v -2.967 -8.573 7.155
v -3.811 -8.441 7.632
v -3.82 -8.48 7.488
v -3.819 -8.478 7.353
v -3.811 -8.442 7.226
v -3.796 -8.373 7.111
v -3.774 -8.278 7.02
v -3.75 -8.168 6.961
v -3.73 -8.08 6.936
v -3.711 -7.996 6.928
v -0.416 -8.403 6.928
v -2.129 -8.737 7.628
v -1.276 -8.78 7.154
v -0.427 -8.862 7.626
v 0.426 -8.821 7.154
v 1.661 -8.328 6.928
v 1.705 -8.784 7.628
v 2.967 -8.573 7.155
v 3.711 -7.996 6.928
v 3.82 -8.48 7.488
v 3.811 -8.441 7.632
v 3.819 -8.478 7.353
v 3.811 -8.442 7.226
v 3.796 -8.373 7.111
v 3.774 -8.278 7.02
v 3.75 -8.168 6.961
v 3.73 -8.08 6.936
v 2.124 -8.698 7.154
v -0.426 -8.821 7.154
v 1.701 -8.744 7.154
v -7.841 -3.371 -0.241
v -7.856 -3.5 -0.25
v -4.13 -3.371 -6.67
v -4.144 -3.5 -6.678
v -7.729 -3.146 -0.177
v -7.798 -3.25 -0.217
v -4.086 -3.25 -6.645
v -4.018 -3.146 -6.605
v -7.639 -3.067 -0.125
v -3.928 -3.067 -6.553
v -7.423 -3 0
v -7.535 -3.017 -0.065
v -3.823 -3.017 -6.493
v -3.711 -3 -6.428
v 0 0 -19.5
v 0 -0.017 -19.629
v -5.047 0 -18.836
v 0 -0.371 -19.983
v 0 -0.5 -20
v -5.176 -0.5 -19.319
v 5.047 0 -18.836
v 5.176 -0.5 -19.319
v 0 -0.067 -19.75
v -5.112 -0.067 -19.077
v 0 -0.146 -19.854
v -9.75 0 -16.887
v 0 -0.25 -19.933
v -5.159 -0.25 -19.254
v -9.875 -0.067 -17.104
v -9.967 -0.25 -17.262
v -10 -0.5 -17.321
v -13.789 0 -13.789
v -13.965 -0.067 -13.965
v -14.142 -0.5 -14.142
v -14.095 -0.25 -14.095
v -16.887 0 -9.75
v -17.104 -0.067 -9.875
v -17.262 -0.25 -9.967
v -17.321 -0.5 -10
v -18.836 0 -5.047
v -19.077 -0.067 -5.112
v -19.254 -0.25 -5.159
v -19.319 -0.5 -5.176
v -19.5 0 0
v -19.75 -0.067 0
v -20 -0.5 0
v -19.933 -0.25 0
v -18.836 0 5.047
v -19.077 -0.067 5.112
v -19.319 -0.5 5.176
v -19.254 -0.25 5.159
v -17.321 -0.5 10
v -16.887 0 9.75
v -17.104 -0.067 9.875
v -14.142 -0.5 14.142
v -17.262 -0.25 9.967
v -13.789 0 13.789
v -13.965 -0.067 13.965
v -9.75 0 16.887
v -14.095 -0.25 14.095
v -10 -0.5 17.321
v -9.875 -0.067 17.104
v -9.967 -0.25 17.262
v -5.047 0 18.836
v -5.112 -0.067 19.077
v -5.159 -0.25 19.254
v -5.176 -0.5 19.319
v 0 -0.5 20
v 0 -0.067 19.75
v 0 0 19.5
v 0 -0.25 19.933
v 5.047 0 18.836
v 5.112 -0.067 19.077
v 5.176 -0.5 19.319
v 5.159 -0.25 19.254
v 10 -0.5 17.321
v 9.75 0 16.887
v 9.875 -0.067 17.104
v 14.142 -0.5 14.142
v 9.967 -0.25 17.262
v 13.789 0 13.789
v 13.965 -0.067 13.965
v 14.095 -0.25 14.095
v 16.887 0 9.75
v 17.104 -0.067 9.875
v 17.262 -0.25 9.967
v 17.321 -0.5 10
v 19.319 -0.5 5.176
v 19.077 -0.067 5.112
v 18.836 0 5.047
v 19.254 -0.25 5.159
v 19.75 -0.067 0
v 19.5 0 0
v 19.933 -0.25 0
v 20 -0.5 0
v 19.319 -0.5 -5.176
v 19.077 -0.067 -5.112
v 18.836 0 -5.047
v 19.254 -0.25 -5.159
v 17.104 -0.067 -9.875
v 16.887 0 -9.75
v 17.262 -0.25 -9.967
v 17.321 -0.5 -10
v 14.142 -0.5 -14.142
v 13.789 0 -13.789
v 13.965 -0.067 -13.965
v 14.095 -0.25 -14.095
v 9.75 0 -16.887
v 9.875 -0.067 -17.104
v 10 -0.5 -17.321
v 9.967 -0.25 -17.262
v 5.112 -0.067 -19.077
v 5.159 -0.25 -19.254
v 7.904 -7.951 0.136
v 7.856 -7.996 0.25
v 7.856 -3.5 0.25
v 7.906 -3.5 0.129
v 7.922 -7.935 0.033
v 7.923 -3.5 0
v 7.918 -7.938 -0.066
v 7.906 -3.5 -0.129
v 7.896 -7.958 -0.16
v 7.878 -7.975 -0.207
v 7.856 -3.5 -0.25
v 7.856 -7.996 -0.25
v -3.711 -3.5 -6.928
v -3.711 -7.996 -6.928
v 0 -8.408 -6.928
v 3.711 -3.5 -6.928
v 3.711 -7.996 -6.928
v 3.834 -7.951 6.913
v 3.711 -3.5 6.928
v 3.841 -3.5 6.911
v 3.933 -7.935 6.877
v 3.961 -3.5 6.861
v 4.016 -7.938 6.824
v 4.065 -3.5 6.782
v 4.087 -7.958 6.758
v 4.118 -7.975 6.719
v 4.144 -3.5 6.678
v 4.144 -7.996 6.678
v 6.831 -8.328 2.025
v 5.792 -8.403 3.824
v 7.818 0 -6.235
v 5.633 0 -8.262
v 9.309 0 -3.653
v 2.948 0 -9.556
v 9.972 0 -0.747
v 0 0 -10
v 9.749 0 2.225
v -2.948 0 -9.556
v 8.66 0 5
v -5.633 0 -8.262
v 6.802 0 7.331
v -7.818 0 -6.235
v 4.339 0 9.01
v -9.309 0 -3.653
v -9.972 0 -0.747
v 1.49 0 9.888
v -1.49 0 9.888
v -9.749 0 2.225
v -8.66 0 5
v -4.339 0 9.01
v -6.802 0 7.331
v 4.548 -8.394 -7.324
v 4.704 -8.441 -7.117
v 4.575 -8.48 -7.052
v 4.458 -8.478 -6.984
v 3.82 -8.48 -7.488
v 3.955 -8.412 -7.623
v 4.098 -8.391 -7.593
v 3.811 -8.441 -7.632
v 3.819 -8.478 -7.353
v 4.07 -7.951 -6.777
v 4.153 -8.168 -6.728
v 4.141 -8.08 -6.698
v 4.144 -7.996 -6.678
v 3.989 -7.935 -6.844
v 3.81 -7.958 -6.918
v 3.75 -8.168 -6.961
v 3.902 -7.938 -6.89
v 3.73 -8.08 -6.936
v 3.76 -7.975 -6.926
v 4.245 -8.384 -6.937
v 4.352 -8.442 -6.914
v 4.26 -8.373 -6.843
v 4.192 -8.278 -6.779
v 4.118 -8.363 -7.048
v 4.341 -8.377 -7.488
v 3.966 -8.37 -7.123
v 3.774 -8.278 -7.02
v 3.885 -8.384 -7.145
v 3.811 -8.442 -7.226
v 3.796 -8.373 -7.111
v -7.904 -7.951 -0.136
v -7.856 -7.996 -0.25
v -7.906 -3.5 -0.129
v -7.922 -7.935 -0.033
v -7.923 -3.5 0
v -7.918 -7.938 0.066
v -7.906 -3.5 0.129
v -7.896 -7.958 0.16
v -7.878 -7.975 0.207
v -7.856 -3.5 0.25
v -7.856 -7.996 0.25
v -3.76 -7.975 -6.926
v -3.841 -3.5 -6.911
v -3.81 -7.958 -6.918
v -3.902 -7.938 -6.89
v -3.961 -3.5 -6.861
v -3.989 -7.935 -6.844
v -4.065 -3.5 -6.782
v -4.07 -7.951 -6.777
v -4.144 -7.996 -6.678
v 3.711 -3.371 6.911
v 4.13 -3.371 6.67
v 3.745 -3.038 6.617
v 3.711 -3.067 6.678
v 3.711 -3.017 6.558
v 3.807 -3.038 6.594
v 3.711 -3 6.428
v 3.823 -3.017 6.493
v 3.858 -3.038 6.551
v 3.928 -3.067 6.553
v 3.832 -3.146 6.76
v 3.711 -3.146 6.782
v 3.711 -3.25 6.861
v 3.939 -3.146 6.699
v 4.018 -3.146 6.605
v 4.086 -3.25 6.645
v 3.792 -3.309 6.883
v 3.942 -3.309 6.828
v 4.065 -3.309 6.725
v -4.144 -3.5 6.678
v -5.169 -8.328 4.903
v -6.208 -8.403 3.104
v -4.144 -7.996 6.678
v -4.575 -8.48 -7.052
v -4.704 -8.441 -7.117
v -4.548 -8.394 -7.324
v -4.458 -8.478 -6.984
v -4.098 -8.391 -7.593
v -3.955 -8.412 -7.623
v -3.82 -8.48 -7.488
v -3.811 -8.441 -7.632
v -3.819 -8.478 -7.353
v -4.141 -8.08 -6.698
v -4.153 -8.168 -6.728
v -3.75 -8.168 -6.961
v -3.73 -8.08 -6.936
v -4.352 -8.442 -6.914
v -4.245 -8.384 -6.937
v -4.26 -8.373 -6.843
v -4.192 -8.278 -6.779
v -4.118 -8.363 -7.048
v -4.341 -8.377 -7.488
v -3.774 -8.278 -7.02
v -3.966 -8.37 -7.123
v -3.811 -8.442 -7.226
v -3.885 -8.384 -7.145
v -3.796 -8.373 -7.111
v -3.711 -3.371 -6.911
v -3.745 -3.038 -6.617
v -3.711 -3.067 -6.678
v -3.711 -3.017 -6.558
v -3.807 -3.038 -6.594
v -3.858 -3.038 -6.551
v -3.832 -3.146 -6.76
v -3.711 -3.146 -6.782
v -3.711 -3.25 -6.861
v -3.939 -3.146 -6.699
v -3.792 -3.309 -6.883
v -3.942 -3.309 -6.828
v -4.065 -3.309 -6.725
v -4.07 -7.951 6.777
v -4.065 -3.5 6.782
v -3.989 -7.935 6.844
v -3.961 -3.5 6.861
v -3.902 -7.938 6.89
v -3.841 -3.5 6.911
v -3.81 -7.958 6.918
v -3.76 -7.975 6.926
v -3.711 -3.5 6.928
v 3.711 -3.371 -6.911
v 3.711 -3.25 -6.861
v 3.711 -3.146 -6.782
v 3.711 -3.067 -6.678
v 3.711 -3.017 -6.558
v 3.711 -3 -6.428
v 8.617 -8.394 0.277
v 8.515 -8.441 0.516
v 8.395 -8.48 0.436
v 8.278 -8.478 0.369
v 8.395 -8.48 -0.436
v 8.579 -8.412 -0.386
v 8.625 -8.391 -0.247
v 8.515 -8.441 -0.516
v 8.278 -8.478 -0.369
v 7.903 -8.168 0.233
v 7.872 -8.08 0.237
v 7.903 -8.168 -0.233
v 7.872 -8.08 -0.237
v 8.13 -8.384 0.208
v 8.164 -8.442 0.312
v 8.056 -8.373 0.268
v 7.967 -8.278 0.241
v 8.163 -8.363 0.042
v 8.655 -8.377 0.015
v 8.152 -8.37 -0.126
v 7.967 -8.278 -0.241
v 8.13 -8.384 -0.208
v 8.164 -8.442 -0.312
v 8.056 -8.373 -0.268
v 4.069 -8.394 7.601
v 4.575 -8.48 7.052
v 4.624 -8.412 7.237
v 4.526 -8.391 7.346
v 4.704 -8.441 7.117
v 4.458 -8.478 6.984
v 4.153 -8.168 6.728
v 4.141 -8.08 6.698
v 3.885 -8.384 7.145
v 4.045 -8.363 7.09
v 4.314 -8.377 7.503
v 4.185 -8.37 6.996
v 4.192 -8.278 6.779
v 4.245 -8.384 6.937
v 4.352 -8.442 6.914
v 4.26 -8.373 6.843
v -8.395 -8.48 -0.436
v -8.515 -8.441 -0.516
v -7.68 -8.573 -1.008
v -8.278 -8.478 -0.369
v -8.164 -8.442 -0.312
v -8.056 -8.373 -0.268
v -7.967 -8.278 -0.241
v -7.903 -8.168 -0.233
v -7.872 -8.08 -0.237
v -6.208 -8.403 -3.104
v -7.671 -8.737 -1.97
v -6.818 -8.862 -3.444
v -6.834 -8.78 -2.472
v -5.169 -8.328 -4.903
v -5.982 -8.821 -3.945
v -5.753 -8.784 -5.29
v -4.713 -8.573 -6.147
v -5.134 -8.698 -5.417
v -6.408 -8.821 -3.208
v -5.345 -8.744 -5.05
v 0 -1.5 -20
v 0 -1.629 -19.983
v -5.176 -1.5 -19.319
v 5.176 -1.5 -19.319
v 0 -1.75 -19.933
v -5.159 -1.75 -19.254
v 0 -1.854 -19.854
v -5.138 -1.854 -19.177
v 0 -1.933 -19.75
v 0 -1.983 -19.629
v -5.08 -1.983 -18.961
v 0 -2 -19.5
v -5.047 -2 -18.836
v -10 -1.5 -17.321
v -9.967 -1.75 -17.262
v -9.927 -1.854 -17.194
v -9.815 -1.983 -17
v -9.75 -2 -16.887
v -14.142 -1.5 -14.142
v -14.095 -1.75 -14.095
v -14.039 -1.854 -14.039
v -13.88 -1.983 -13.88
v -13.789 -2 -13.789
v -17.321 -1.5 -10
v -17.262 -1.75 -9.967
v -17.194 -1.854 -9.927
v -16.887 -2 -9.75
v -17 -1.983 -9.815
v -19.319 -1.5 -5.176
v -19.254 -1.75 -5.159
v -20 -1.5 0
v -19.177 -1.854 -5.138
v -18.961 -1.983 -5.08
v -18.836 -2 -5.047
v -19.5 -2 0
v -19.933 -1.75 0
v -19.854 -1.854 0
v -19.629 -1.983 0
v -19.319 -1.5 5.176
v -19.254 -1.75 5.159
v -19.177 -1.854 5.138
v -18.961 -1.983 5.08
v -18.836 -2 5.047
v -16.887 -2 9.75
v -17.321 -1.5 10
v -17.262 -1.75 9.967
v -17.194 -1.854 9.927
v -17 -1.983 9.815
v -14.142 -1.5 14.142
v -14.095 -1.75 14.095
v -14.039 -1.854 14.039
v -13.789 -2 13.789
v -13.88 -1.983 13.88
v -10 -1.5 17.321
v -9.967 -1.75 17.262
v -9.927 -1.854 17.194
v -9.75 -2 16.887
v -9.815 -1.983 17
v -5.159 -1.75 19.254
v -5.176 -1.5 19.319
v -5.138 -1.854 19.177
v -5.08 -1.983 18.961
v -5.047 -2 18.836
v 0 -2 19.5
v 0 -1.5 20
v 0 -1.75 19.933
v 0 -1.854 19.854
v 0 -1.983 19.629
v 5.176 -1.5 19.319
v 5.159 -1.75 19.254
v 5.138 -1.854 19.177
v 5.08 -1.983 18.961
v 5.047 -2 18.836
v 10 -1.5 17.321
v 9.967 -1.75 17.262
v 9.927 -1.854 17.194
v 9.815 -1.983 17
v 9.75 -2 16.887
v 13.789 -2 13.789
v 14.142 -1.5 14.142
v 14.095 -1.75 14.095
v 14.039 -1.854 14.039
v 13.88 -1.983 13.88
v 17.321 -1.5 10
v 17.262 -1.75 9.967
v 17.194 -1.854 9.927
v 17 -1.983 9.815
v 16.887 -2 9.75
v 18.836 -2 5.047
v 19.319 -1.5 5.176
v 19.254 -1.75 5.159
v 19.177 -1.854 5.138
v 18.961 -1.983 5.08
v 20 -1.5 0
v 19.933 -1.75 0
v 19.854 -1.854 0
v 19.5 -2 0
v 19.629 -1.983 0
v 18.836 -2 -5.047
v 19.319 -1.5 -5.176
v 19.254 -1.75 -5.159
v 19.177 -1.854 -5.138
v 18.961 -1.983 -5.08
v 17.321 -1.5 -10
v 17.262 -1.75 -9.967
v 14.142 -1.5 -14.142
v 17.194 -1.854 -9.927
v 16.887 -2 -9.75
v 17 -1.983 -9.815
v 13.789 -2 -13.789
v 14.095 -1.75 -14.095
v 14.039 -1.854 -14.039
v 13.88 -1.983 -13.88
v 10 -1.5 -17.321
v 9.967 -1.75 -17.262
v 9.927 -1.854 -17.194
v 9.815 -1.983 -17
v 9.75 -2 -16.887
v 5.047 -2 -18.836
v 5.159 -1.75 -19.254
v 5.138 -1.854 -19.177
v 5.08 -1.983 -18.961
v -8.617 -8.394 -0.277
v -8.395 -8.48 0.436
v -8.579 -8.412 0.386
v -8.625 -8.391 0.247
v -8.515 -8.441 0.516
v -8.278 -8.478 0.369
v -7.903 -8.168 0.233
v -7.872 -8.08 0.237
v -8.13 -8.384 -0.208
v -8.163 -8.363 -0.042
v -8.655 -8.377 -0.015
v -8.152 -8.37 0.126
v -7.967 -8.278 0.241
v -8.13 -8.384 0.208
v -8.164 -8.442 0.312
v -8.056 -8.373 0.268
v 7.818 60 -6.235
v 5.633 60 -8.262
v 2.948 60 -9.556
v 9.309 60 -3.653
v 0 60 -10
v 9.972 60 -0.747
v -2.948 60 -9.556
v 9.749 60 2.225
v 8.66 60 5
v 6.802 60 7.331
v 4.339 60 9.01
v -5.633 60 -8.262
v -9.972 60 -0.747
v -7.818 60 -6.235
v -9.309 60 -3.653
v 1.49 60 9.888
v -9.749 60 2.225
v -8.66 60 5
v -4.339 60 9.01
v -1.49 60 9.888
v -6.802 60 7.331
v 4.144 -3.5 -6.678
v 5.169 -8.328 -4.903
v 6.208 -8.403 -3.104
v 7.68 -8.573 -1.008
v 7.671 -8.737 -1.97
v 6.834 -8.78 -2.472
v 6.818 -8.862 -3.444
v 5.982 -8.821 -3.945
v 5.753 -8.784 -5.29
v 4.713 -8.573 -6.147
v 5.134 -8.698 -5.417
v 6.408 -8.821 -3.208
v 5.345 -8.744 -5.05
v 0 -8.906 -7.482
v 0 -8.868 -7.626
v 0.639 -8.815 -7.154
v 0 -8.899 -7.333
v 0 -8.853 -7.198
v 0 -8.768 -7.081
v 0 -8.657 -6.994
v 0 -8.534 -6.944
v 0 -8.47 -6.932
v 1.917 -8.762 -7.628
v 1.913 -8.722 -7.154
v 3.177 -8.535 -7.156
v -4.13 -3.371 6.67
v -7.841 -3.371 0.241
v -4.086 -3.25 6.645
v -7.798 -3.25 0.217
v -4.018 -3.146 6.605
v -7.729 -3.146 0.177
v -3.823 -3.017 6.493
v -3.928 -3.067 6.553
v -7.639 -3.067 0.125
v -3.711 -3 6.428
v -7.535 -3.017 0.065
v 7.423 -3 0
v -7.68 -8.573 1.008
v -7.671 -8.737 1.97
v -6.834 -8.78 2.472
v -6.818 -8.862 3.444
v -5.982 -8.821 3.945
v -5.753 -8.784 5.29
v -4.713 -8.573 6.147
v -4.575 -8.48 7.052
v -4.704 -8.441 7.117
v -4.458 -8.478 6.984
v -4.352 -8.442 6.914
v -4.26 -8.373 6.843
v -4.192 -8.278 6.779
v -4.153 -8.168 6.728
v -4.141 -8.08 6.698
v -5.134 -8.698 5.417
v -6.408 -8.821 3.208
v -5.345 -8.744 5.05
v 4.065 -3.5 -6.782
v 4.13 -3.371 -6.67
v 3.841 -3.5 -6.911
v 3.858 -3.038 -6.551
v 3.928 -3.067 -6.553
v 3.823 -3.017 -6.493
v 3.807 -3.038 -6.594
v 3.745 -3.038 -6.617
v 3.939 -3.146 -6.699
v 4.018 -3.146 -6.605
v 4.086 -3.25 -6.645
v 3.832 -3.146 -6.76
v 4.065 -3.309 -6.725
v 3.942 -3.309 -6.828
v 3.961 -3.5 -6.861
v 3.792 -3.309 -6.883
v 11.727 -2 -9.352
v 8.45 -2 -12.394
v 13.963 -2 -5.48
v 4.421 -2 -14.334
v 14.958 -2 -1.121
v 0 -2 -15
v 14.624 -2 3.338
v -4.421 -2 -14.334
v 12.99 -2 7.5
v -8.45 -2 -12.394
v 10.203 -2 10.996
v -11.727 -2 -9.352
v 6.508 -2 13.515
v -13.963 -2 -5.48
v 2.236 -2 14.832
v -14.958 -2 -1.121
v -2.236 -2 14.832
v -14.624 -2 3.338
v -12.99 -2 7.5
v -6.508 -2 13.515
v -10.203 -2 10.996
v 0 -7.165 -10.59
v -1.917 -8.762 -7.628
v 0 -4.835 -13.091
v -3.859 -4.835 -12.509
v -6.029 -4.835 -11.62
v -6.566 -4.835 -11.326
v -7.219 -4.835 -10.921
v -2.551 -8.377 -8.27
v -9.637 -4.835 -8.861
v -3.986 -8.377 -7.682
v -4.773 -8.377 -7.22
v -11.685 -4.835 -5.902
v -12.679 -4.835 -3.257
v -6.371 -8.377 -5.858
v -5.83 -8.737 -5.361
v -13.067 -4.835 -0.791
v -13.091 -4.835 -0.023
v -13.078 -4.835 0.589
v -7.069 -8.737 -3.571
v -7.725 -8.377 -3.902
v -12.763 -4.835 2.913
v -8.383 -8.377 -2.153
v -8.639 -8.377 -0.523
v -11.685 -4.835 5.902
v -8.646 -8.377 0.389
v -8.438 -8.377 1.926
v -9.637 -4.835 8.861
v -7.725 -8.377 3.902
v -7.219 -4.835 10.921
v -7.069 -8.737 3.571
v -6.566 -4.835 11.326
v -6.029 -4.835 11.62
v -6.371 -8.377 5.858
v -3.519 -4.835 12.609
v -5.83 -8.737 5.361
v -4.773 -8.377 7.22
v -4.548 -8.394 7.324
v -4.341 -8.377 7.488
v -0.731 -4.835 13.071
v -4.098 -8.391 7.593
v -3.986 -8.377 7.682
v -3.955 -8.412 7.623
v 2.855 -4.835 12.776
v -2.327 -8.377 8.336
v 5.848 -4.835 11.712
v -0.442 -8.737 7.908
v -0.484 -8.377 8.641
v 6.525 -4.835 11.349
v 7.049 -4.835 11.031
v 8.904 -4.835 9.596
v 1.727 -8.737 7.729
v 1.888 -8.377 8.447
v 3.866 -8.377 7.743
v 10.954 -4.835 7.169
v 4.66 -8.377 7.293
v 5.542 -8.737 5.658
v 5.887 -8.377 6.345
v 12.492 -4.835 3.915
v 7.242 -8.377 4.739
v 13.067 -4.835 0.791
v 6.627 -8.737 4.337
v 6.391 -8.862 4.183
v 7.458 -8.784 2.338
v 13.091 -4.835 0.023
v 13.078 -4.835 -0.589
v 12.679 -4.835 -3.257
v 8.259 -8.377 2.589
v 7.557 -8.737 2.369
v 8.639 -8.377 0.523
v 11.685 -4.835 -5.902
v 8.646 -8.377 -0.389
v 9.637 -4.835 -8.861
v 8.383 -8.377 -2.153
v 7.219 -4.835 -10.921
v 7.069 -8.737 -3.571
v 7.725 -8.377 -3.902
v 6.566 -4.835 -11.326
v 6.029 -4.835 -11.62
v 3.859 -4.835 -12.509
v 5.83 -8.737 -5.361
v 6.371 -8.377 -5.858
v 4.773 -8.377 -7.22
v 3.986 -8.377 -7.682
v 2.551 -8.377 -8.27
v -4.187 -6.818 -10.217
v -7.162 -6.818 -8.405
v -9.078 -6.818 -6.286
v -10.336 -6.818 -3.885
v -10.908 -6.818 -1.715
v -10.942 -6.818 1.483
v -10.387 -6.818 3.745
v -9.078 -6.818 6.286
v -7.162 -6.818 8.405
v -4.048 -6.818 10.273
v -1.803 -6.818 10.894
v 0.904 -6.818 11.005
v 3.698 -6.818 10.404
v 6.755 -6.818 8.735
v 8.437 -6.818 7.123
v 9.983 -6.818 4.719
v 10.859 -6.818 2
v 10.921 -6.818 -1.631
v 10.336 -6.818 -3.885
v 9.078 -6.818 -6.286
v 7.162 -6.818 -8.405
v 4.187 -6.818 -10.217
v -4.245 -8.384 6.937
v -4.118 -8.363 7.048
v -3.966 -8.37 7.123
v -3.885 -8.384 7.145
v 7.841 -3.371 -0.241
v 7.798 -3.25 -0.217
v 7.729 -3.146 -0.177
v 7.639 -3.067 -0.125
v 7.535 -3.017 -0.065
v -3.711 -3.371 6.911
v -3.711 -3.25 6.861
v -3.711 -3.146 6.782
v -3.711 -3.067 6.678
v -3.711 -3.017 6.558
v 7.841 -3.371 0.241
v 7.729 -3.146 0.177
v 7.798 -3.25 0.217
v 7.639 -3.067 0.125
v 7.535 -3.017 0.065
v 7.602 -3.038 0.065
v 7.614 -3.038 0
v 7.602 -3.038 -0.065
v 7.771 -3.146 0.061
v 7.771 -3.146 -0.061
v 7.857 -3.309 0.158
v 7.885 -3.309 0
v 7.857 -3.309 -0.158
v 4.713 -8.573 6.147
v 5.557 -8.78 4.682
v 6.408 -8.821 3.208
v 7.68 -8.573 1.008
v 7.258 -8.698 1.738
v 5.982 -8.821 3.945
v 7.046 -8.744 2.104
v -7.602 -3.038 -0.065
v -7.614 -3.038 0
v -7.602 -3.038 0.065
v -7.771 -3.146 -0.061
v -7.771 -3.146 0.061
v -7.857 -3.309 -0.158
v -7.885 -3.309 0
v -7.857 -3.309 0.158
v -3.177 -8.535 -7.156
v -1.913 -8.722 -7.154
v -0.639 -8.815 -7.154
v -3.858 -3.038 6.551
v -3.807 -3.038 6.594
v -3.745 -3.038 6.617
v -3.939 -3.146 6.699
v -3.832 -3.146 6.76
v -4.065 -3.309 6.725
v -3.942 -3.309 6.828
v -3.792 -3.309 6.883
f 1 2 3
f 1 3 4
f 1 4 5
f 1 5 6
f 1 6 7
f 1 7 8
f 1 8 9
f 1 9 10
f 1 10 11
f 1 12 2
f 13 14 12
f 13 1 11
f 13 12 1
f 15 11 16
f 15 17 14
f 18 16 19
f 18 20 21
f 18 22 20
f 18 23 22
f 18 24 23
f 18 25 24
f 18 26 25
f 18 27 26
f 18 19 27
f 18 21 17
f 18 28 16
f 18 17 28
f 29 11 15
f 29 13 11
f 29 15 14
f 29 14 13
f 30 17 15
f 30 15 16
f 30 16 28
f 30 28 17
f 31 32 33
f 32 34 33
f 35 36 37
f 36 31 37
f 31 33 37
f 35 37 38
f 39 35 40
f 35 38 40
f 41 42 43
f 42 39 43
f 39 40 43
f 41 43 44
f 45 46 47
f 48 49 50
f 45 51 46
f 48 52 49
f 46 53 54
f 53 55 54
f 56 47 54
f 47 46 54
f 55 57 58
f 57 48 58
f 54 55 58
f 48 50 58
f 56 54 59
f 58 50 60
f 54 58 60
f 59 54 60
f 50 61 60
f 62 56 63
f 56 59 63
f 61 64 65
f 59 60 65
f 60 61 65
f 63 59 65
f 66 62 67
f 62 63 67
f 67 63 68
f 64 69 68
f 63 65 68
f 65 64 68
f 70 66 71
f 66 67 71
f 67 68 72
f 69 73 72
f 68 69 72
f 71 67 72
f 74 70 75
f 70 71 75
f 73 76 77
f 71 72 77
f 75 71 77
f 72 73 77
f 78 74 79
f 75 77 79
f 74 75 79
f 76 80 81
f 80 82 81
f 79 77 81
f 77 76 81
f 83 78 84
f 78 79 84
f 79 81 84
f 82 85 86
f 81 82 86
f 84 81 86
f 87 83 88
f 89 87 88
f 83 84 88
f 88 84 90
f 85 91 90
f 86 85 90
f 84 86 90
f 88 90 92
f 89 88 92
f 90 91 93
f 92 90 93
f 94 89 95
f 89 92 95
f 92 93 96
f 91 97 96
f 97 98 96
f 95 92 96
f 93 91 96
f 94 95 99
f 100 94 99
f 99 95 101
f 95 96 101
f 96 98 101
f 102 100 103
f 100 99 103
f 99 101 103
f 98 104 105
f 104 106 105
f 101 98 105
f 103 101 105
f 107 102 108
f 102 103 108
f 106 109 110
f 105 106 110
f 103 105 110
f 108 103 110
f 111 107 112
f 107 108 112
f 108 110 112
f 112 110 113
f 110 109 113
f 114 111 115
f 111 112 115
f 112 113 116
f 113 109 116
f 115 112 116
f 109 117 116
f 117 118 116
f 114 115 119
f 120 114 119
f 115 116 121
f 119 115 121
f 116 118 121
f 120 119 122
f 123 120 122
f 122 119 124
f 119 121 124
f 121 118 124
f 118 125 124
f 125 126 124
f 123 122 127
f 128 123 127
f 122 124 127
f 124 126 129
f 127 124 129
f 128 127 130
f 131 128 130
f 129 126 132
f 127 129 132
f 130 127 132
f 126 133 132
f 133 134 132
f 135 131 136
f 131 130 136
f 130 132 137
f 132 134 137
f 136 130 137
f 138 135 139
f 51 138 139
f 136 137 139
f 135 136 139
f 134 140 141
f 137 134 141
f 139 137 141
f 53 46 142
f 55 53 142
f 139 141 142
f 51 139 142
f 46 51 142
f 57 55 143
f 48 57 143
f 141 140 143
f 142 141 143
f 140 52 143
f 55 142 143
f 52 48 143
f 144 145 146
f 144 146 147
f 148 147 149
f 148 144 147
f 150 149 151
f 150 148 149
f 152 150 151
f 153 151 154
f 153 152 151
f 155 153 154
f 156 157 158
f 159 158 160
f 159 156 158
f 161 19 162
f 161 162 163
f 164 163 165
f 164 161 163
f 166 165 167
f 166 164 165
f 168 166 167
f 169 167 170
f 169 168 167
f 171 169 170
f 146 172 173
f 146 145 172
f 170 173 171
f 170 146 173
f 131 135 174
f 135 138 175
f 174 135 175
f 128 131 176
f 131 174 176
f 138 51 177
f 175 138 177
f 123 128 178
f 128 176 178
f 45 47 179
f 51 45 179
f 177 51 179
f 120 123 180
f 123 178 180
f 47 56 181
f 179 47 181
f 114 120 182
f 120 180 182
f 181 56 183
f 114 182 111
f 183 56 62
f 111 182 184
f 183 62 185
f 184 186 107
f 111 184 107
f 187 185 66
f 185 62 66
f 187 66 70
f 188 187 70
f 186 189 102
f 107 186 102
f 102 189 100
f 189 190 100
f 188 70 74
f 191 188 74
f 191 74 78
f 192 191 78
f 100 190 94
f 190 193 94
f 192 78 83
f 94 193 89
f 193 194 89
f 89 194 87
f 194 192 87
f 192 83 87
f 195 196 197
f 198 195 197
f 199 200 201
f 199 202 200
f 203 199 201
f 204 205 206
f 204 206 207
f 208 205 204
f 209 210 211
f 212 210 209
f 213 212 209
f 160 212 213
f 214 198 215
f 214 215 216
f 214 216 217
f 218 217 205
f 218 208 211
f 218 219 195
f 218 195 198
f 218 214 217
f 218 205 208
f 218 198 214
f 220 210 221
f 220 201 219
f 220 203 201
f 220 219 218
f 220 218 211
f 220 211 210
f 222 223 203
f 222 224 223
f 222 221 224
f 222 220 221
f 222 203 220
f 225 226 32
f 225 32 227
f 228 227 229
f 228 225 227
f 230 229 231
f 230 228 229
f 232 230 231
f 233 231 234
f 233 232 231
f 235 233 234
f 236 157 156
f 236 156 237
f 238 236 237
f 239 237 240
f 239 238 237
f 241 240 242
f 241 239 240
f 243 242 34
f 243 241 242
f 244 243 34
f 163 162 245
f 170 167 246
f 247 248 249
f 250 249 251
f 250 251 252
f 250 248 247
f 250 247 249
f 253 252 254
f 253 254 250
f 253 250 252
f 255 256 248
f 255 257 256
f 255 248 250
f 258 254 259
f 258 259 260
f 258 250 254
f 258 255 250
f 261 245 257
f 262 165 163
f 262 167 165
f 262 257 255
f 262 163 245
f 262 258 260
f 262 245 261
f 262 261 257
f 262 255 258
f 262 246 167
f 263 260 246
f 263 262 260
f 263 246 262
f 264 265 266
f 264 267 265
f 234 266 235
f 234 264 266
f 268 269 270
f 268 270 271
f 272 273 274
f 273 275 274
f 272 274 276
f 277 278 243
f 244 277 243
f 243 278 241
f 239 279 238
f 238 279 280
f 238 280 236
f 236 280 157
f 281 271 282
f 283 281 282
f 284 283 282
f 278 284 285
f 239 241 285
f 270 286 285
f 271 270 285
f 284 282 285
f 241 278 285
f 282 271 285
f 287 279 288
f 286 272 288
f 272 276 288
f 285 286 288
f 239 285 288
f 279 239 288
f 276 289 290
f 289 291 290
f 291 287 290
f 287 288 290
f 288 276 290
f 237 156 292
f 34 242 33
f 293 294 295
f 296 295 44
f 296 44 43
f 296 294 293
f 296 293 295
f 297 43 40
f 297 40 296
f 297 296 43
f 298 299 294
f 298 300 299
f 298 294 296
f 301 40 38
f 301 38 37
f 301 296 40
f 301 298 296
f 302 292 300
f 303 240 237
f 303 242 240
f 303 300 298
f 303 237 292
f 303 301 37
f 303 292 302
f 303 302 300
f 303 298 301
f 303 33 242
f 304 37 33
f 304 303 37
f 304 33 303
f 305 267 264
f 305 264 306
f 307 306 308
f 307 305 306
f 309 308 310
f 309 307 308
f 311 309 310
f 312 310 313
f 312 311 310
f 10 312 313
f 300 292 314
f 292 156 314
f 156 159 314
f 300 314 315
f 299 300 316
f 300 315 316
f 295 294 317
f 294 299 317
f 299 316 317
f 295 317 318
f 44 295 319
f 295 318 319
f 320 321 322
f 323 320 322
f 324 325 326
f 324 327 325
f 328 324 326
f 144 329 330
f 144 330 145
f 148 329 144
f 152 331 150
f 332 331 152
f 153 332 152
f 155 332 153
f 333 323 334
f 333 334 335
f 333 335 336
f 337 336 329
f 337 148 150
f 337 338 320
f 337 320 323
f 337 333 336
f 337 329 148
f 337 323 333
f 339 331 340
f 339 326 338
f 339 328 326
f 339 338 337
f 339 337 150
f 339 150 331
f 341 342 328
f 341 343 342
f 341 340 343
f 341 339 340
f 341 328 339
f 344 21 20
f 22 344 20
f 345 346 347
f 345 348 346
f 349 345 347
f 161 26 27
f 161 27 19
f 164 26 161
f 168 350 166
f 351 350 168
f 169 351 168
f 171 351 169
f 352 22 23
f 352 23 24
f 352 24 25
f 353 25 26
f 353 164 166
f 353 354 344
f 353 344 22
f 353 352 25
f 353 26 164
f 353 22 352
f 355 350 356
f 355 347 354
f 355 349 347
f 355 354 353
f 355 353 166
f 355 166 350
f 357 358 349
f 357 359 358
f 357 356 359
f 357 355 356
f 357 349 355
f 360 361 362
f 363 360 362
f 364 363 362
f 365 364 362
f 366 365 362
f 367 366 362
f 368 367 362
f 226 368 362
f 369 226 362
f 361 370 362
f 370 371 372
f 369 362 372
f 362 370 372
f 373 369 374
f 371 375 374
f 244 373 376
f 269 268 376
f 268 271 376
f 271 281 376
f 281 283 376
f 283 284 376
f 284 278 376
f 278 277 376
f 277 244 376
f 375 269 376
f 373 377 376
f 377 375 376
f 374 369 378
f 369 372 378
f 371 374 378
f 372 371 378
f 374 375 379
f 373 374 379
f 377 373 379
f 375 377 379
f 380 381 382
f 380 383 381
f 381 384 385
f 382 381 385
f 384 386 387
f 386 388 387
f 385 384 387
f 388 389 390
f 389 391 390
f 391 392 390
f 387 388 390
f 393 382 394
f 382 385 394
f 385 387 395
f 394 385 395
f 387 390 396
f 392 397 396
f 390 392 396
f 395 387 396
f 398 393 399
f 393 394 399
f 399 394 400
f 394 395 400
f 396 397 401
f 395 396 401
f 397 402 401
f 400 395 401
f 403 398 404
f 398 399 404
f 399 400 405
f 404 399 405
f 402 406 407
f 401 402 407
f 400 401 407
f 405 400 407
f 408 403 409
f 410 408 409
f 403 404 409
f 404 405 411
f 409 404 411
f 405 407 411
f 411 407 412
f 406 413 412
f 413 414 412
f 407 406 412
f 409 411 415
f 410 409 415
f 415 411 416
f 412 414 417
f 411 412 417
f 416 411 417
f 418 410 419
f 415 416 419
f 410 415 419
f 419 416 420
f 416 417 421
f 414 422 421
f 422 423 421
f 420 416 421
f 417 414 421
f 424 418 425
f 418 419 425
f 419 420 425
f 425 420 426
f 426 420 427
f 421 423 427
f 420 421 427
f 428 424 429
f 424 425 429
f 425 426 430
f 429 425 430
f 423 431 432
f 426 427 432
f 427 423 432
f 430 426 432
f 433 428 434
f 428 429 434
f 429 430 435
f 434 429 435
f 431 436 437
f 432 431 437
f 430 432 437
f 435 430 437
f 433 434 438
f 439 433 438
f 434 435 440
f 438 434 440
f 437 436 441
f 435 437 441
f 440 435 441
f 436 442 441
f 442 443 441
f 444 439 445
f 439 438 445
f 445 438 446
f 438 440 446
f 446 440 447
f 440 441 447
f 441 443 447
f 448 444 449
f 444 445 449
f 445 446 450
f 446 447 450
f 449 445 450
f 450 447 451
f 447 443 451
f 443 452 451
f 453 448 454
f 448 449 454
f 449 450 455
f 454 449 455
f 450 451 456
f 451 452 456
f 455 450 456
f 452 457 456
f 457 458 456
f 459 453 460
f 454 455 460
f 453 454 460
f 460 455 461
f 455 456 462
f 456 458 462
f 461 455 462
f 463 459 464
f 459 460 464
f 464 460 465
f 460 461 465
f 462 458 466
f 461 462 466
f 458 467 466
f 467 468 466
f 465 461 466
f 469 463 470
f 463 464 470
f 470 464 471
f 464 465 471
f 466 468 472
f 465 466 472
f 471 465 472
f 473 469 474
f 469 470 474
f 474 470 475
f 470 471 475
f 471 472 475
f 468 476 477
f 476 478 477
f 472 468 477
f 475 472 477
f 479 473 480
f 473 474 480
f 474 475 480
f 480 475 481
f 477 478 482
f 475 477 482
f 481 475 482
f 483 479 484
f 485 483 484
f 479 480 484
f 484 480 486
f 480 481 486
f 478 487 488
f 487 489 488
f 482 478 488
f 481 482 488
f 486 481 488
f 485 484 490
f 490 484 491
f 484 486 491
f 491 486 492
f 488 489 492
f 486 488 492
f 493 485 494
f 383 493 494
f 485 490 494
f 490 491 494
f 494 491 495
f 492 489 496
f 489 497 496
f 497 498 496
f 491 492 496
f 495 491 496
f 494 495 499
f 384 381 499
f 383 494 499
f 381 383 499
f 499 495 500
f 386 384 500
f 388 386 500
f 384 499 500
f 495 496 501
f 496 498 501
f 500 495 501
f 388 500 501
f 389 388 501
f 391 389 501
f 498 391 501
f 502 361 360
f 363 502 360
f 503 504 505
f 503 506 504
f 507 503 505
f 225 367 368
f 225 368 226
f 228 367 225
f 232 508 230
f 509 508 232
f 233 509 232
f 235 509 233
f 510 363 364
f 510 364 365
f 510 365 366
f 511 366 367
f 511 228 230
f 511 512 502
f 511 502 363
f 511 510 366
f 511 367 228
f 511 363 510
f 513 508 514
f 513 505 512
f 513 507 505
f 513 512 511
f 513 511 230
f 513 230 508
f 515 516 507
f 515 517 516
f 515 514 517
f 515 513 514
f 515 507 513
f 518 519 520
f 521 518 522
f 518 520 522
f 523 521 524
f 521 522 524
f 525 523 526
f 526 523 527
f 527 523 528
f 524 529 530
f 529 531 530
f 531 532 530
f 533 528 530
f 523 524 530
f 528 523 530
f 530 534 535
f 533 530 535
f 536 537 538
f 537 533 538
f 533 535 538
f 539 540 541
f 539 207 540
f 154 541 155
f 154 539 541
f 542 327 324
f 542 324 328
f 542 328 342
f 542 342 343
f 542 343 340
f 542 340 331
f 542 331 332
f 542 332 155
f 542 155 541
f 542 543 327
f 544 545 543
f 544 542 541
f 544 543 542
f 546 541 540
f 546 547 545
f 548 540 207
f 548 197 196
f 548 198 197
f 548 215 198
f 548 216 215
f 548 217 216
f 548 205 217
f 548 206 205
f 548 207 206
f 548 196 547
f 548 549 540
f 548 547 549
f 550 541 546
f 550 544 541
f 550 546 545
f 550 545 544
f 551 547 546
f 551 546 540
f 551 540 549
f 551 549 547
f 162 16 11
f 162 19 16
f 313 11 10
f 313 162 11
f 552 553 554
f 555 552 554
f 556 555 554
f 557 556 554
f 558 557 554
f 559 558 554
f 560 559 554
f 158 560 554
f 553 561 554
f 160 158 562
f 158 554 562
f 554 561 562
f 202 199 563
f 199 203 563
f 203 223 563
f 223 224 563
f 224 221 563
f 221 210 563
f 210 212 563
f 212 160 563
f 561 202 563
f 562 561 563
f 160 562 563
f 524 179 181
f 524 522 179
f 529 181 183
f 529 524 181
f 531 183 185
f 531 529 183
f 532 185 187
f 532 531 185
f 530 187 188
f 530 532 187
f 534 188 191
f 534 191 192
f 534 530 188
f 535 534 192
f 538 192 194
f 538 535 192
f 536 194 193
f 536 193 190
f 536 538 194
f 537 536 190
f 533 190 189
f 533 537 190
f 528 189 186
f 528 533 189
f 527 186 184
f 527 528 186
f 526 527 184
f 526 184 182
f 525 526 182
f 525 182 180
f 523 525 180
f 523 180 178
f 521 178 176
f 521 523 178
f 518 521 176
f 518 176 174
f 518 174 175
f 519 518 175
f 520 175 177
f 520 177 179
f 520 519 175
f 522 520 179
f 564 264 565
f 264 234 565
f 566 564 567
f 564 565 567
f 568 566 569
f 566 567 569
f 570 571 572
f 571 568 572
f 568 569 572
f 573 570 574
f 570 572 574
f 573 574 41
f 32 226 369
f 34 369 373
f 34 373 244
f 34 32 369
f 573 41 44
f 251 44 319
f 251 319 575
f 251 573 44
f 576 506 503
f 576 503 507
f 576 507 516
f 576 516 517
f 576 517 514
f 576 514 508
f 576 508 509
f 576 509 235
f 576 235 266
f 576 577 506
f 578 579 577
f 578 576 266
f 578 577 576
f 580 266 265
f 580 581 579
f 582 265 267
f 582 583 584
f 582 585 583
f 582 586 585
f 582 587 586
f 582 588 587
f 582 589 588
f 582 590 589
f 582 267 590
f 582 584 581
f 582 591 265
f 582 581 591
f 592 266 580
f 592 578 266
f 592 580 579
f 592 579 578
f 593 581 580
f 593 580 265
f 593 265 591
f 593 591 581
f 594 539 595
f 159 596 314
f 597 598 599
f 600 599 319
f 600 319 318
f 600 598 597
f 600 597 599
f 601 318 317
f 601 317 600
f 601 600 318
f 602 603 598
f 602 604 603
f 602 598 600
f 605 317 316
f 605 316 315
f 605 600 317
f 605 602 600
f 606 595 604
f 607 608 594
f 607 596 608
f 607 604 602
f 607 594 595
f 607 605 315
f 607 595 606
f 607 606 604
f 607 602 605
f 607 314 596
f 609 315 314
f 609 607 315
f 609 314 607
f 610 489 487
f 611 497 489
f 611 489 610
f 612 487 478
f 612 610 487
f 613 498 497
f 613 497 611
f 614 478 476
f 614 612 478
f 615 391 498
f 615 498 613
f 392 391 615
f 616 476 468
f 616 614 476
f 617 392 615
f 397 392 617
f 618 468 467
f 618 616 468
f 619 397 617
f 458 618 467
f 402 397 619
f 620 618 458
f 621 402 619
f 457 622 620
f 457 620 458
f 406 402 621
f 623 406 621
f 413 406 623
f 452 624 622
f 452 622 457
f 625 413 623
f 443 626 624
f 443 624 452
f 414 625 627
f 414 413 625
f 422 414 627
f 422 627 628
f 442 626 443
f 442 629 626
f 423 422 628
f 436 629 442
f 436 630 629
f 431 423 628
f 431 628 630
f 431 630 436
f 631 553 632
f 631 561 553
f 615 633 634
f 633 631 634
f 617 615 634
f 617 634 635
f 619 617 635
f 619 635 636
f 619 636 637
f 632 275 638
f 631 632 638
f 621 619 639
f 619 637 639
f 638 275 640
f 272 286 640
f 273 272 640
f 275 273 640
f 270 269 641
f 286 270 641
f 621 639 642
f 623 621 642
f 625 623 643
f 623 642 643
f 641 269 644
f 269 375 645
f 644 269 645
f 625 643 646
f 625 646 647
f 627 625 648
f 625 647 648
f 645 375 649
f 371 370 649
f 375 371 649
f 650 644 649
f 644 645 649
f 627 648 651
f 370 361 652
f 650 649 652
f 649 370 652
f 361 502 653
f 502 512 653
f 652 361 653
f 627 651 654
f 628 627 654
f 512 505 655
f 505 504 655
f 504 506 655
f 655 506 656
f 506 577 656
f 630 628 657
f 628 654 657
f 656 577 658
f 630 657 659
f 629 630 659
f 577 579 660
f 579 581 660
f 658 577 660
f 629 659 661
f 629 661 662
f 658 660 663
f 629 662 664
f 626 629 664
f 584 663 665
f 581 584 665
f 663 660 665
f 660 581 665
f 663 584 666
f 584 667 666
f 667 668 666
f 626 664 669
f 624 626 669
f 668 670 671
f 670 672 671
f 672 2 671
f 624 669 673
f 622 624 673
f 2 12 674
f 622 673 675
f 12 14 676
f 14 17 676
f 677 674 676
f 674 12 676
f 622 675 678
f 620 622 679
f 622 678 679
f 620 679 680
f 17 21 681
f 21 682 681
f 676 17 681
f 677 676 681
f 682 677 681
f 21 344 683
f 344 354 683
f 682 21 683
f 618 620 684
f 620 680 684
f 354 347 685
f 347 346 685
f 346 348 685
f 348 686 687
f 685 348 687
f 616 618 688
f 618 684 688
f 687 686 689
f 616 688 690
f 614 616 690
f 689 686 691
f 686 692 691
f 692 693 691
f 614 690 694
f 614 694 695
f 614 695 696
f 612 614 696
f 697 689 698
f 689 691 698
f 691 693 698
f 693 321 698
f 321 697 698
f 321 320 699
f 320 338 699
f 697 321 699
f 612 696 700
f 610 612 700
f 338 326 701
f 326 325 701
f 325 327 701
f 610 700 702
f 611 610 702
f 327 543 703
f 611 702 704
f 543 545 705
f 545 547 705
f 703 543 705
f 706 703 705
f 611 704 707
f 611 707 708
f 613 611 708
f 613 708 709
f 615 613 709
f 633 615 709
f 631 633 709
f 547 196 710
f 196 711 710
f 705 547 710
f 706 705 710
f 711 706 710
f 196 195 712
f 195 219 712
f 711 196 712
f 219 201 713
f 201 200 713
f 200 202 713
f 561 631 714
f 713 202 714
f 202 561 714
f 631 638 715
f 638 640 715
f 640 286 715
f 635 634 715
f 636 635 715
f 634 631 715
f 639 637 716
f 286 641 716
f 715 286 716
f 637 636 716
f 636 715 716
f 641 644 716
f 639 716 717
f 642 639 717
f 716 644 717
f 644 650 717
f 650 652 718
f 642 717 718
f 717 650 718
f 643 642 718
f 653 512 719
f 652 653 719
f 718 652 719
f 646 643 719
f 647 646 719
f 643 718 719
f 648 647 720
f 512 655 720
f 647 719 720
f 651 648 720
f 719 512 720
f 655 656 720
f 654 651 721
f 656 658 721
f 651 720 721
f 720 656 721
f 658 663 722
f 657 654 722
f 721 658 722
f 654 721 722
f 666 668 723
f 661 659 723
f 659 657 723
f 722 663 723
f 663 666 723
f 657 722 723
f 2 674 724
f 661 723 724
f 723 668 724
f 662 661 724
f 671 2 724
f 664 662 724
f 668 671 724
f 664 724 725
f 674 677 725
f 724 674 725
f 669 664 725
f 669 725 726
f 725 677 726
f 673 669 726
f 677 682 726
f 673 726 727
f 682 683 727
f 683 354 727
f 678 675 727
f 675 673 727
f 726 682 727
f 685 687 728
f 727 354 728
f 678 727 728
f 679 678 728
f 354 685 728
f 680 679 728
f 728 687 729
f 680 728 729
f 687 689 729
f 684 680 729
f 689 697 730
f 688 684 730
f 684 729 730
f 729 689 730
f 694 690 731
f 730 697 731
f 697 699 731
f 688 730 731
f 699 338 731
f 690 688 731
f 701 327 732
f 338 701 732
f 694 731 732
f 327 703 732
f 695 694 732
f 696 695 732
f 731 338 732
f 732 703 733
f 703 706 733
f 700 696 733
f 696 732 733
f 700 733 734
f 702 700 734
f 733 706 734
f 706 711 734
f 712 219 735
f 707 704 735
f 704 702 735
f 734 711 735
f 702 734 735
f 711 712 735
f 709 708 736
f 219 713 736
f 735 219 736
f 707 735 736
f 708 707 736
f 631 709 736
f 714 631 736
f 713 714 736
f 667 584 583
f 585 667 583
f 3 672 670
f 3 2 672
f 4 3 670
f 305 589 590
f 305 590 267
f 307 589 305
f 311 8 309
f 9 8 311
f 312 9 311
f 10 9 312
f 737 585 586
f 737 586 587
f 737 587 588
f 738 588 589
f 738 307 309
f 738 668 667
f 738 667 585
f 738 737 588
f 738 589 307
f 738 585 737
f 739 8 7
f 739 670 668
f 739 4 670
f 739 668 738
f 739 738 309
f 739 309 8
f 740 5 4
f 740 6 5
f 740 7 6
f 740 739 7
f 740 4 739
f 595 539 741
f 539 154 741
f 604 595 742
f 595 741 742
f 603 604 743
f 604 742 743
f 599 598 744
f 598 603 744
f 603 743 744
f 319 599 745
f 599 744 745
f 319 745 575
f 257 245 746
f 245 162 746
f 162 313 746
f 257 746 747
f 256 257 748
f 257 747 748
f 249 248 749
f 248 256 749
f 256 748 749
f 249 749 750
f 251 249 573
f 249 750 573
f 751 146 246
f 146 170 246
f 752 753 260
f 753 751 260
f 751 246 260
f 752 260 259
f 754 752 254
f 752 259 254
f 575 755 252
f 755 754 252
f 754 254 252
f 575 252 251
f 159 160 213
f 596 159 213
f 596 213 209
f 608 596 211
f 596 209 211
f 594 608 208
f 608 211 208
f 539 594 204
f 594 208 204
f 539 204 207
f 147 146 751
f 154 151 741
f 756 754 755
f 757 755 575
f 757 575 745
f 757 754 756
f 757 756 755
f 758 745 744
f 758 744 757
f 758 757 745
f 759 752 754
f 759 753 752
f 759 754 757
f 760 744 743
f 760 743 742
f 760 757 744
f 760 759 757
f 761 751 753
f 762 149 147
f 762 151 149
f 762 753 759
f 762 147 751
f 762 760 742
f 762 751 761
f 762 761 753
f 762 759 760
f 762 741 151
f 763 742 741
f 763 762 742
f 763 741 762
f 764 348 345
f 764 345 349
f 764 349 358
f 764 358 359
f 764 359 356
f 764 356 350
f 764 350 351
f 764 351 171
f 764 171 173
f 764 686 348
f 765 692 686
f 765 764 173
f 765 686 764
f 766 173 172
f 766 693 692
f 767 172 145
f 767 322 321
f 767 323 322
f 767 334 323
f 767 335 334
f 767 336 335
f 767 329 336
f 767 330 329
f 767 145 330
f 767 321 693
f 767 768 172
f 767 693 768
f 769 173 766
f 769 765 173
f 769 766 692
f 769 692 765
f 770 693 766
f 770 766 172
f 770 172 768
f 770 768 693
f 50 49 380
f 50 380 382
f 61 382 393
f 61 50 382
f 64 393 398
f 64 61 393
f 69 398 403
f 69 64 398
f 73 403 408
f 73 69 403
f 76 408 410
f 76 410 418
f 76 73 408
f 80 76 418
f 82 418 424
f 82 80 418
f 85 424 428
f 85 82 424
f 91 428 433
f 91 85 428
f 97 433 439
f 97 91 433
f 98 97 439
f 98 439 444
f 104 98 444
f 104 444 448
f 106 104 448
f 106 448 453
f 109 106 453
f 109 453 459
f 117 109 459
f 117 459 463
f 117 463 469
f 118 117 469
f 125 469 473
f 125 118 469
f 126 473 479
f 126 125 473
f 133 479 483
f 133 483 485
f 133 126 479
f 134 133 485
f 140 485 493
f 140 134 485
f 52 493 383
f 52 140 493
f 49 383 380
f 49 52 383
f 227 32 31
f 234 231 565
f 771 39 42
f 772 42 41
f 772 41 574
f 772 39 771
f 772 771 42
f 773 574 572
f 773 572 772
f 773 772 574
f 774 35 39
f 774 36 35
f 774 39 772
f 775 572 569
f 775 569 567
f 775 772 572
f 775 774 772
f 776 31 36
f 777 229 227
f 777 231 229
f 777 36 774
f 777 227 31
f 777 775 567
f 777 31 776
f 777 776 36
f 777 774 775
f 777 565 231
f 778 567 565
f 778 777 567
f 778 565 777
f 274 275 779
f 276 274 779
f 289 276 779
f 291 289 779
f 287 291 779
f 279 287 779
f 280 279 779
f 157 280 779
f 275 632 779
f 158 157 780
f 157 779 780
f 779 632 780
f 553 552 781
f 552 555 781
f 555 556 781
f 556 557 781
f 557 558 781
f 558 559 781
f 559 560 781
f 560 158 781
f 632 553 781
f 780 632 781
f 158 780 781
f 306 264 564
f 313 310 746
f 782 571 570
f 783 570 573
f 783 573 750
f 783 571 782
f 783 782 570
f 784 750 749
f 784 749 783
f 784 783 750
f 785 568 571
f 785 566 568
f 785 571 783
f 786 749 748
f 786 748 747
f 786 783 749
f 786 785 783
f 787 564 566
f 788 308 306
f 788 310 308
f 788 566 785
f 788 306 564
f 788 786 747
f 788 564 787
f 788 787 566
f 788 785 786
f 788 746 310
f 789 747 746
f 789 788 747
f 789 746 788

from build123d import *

# Parameters (mm, degrees)
SKETCH1_W          = 60
SKETCH1_H          = 10
CUT_EXTRUDE1_START = 1
CUT_EXTRUDE1_DEPTH = 10
FILLET1_R          = 0.5


with BuildPart() as part:
    # Sketch1 → Revolve1 (revolve)
    with BuildSketch(Plane.YZ, mode=Mode.PRIVATE) as revolve1_sk:
        with BuildLine():
            Line((-10, 0), (-2, 0))
            Line((-2, 0), (-2, 15))
            ThreePointArc((-2, 15), (-8.330111387, 8.742726073), (-10, 0))
        make_face()
        Polygon((0, 20), (0, 10), (0, 0), (-2, 0), (-2, 20), align=None)
        with Locations((30, 5)):
            Rectangle(SKETCH1_W, SKETCH1_H)
    revolve(revolve1_sk.sketch.rotate(Axis((0, -21.912032937, 0), (0, 1, 0)), 180), axis=Axis((0, -21.912032937, 0), (0, 1, 0)))

    # Sketch2 → Cut-Extrude1 (cut)
    with BuildSketch(Plane.XZ.offset(2).offset(CUT_EXTRUDE1_START)):
        Polygon((4, -6.92820323), (8, 0), (4, 6.92820323), (-4, 6.92820323), (-8, 0), (-4, -6.92820323), align=None)
    extrude(amount=CUT_EXTRUDE1_DEPTH, mode=Mode.SUBTRACT)

    # Fillet1
    fillet1_edges = [part.edges().sort_by_distance(p)[0] for p in [
        (-6, -9.148190897, -3.464101615),
        (-6, -9.148190897, 3.464101615),
        (0, -9.148190897, 6.92820323),
        (6, -9.148190897, 3.464101615),
        (6, -9.148190897, -3.464101615),
        (-2.012812506, -9.037939191, -6.92820323),
        (-4, -5.850108704, -6.92820323),
        (0, -3, -6.92820323),
        (4, -5.850108704, -6.92820323),
        (6, -3, -3.464101615),
        (8, -5.850108704, 0),
        (6, -3, 3.464101615),
        (4, -5.850108704, 6.92820323),
        (0, -3, 6.92820323),
        (-4, -5.850108704, 6.92820323),
        (-6, -3, 3.464101615),
        (-8, -5.850108704, 0),
        (-6, -3, -3.464101615),
        (0, -2, 20),
        (0, 0, 20),
    ]]
    fillet(fillet1_edges, radius=FILLET1_R)


solid = part.part
